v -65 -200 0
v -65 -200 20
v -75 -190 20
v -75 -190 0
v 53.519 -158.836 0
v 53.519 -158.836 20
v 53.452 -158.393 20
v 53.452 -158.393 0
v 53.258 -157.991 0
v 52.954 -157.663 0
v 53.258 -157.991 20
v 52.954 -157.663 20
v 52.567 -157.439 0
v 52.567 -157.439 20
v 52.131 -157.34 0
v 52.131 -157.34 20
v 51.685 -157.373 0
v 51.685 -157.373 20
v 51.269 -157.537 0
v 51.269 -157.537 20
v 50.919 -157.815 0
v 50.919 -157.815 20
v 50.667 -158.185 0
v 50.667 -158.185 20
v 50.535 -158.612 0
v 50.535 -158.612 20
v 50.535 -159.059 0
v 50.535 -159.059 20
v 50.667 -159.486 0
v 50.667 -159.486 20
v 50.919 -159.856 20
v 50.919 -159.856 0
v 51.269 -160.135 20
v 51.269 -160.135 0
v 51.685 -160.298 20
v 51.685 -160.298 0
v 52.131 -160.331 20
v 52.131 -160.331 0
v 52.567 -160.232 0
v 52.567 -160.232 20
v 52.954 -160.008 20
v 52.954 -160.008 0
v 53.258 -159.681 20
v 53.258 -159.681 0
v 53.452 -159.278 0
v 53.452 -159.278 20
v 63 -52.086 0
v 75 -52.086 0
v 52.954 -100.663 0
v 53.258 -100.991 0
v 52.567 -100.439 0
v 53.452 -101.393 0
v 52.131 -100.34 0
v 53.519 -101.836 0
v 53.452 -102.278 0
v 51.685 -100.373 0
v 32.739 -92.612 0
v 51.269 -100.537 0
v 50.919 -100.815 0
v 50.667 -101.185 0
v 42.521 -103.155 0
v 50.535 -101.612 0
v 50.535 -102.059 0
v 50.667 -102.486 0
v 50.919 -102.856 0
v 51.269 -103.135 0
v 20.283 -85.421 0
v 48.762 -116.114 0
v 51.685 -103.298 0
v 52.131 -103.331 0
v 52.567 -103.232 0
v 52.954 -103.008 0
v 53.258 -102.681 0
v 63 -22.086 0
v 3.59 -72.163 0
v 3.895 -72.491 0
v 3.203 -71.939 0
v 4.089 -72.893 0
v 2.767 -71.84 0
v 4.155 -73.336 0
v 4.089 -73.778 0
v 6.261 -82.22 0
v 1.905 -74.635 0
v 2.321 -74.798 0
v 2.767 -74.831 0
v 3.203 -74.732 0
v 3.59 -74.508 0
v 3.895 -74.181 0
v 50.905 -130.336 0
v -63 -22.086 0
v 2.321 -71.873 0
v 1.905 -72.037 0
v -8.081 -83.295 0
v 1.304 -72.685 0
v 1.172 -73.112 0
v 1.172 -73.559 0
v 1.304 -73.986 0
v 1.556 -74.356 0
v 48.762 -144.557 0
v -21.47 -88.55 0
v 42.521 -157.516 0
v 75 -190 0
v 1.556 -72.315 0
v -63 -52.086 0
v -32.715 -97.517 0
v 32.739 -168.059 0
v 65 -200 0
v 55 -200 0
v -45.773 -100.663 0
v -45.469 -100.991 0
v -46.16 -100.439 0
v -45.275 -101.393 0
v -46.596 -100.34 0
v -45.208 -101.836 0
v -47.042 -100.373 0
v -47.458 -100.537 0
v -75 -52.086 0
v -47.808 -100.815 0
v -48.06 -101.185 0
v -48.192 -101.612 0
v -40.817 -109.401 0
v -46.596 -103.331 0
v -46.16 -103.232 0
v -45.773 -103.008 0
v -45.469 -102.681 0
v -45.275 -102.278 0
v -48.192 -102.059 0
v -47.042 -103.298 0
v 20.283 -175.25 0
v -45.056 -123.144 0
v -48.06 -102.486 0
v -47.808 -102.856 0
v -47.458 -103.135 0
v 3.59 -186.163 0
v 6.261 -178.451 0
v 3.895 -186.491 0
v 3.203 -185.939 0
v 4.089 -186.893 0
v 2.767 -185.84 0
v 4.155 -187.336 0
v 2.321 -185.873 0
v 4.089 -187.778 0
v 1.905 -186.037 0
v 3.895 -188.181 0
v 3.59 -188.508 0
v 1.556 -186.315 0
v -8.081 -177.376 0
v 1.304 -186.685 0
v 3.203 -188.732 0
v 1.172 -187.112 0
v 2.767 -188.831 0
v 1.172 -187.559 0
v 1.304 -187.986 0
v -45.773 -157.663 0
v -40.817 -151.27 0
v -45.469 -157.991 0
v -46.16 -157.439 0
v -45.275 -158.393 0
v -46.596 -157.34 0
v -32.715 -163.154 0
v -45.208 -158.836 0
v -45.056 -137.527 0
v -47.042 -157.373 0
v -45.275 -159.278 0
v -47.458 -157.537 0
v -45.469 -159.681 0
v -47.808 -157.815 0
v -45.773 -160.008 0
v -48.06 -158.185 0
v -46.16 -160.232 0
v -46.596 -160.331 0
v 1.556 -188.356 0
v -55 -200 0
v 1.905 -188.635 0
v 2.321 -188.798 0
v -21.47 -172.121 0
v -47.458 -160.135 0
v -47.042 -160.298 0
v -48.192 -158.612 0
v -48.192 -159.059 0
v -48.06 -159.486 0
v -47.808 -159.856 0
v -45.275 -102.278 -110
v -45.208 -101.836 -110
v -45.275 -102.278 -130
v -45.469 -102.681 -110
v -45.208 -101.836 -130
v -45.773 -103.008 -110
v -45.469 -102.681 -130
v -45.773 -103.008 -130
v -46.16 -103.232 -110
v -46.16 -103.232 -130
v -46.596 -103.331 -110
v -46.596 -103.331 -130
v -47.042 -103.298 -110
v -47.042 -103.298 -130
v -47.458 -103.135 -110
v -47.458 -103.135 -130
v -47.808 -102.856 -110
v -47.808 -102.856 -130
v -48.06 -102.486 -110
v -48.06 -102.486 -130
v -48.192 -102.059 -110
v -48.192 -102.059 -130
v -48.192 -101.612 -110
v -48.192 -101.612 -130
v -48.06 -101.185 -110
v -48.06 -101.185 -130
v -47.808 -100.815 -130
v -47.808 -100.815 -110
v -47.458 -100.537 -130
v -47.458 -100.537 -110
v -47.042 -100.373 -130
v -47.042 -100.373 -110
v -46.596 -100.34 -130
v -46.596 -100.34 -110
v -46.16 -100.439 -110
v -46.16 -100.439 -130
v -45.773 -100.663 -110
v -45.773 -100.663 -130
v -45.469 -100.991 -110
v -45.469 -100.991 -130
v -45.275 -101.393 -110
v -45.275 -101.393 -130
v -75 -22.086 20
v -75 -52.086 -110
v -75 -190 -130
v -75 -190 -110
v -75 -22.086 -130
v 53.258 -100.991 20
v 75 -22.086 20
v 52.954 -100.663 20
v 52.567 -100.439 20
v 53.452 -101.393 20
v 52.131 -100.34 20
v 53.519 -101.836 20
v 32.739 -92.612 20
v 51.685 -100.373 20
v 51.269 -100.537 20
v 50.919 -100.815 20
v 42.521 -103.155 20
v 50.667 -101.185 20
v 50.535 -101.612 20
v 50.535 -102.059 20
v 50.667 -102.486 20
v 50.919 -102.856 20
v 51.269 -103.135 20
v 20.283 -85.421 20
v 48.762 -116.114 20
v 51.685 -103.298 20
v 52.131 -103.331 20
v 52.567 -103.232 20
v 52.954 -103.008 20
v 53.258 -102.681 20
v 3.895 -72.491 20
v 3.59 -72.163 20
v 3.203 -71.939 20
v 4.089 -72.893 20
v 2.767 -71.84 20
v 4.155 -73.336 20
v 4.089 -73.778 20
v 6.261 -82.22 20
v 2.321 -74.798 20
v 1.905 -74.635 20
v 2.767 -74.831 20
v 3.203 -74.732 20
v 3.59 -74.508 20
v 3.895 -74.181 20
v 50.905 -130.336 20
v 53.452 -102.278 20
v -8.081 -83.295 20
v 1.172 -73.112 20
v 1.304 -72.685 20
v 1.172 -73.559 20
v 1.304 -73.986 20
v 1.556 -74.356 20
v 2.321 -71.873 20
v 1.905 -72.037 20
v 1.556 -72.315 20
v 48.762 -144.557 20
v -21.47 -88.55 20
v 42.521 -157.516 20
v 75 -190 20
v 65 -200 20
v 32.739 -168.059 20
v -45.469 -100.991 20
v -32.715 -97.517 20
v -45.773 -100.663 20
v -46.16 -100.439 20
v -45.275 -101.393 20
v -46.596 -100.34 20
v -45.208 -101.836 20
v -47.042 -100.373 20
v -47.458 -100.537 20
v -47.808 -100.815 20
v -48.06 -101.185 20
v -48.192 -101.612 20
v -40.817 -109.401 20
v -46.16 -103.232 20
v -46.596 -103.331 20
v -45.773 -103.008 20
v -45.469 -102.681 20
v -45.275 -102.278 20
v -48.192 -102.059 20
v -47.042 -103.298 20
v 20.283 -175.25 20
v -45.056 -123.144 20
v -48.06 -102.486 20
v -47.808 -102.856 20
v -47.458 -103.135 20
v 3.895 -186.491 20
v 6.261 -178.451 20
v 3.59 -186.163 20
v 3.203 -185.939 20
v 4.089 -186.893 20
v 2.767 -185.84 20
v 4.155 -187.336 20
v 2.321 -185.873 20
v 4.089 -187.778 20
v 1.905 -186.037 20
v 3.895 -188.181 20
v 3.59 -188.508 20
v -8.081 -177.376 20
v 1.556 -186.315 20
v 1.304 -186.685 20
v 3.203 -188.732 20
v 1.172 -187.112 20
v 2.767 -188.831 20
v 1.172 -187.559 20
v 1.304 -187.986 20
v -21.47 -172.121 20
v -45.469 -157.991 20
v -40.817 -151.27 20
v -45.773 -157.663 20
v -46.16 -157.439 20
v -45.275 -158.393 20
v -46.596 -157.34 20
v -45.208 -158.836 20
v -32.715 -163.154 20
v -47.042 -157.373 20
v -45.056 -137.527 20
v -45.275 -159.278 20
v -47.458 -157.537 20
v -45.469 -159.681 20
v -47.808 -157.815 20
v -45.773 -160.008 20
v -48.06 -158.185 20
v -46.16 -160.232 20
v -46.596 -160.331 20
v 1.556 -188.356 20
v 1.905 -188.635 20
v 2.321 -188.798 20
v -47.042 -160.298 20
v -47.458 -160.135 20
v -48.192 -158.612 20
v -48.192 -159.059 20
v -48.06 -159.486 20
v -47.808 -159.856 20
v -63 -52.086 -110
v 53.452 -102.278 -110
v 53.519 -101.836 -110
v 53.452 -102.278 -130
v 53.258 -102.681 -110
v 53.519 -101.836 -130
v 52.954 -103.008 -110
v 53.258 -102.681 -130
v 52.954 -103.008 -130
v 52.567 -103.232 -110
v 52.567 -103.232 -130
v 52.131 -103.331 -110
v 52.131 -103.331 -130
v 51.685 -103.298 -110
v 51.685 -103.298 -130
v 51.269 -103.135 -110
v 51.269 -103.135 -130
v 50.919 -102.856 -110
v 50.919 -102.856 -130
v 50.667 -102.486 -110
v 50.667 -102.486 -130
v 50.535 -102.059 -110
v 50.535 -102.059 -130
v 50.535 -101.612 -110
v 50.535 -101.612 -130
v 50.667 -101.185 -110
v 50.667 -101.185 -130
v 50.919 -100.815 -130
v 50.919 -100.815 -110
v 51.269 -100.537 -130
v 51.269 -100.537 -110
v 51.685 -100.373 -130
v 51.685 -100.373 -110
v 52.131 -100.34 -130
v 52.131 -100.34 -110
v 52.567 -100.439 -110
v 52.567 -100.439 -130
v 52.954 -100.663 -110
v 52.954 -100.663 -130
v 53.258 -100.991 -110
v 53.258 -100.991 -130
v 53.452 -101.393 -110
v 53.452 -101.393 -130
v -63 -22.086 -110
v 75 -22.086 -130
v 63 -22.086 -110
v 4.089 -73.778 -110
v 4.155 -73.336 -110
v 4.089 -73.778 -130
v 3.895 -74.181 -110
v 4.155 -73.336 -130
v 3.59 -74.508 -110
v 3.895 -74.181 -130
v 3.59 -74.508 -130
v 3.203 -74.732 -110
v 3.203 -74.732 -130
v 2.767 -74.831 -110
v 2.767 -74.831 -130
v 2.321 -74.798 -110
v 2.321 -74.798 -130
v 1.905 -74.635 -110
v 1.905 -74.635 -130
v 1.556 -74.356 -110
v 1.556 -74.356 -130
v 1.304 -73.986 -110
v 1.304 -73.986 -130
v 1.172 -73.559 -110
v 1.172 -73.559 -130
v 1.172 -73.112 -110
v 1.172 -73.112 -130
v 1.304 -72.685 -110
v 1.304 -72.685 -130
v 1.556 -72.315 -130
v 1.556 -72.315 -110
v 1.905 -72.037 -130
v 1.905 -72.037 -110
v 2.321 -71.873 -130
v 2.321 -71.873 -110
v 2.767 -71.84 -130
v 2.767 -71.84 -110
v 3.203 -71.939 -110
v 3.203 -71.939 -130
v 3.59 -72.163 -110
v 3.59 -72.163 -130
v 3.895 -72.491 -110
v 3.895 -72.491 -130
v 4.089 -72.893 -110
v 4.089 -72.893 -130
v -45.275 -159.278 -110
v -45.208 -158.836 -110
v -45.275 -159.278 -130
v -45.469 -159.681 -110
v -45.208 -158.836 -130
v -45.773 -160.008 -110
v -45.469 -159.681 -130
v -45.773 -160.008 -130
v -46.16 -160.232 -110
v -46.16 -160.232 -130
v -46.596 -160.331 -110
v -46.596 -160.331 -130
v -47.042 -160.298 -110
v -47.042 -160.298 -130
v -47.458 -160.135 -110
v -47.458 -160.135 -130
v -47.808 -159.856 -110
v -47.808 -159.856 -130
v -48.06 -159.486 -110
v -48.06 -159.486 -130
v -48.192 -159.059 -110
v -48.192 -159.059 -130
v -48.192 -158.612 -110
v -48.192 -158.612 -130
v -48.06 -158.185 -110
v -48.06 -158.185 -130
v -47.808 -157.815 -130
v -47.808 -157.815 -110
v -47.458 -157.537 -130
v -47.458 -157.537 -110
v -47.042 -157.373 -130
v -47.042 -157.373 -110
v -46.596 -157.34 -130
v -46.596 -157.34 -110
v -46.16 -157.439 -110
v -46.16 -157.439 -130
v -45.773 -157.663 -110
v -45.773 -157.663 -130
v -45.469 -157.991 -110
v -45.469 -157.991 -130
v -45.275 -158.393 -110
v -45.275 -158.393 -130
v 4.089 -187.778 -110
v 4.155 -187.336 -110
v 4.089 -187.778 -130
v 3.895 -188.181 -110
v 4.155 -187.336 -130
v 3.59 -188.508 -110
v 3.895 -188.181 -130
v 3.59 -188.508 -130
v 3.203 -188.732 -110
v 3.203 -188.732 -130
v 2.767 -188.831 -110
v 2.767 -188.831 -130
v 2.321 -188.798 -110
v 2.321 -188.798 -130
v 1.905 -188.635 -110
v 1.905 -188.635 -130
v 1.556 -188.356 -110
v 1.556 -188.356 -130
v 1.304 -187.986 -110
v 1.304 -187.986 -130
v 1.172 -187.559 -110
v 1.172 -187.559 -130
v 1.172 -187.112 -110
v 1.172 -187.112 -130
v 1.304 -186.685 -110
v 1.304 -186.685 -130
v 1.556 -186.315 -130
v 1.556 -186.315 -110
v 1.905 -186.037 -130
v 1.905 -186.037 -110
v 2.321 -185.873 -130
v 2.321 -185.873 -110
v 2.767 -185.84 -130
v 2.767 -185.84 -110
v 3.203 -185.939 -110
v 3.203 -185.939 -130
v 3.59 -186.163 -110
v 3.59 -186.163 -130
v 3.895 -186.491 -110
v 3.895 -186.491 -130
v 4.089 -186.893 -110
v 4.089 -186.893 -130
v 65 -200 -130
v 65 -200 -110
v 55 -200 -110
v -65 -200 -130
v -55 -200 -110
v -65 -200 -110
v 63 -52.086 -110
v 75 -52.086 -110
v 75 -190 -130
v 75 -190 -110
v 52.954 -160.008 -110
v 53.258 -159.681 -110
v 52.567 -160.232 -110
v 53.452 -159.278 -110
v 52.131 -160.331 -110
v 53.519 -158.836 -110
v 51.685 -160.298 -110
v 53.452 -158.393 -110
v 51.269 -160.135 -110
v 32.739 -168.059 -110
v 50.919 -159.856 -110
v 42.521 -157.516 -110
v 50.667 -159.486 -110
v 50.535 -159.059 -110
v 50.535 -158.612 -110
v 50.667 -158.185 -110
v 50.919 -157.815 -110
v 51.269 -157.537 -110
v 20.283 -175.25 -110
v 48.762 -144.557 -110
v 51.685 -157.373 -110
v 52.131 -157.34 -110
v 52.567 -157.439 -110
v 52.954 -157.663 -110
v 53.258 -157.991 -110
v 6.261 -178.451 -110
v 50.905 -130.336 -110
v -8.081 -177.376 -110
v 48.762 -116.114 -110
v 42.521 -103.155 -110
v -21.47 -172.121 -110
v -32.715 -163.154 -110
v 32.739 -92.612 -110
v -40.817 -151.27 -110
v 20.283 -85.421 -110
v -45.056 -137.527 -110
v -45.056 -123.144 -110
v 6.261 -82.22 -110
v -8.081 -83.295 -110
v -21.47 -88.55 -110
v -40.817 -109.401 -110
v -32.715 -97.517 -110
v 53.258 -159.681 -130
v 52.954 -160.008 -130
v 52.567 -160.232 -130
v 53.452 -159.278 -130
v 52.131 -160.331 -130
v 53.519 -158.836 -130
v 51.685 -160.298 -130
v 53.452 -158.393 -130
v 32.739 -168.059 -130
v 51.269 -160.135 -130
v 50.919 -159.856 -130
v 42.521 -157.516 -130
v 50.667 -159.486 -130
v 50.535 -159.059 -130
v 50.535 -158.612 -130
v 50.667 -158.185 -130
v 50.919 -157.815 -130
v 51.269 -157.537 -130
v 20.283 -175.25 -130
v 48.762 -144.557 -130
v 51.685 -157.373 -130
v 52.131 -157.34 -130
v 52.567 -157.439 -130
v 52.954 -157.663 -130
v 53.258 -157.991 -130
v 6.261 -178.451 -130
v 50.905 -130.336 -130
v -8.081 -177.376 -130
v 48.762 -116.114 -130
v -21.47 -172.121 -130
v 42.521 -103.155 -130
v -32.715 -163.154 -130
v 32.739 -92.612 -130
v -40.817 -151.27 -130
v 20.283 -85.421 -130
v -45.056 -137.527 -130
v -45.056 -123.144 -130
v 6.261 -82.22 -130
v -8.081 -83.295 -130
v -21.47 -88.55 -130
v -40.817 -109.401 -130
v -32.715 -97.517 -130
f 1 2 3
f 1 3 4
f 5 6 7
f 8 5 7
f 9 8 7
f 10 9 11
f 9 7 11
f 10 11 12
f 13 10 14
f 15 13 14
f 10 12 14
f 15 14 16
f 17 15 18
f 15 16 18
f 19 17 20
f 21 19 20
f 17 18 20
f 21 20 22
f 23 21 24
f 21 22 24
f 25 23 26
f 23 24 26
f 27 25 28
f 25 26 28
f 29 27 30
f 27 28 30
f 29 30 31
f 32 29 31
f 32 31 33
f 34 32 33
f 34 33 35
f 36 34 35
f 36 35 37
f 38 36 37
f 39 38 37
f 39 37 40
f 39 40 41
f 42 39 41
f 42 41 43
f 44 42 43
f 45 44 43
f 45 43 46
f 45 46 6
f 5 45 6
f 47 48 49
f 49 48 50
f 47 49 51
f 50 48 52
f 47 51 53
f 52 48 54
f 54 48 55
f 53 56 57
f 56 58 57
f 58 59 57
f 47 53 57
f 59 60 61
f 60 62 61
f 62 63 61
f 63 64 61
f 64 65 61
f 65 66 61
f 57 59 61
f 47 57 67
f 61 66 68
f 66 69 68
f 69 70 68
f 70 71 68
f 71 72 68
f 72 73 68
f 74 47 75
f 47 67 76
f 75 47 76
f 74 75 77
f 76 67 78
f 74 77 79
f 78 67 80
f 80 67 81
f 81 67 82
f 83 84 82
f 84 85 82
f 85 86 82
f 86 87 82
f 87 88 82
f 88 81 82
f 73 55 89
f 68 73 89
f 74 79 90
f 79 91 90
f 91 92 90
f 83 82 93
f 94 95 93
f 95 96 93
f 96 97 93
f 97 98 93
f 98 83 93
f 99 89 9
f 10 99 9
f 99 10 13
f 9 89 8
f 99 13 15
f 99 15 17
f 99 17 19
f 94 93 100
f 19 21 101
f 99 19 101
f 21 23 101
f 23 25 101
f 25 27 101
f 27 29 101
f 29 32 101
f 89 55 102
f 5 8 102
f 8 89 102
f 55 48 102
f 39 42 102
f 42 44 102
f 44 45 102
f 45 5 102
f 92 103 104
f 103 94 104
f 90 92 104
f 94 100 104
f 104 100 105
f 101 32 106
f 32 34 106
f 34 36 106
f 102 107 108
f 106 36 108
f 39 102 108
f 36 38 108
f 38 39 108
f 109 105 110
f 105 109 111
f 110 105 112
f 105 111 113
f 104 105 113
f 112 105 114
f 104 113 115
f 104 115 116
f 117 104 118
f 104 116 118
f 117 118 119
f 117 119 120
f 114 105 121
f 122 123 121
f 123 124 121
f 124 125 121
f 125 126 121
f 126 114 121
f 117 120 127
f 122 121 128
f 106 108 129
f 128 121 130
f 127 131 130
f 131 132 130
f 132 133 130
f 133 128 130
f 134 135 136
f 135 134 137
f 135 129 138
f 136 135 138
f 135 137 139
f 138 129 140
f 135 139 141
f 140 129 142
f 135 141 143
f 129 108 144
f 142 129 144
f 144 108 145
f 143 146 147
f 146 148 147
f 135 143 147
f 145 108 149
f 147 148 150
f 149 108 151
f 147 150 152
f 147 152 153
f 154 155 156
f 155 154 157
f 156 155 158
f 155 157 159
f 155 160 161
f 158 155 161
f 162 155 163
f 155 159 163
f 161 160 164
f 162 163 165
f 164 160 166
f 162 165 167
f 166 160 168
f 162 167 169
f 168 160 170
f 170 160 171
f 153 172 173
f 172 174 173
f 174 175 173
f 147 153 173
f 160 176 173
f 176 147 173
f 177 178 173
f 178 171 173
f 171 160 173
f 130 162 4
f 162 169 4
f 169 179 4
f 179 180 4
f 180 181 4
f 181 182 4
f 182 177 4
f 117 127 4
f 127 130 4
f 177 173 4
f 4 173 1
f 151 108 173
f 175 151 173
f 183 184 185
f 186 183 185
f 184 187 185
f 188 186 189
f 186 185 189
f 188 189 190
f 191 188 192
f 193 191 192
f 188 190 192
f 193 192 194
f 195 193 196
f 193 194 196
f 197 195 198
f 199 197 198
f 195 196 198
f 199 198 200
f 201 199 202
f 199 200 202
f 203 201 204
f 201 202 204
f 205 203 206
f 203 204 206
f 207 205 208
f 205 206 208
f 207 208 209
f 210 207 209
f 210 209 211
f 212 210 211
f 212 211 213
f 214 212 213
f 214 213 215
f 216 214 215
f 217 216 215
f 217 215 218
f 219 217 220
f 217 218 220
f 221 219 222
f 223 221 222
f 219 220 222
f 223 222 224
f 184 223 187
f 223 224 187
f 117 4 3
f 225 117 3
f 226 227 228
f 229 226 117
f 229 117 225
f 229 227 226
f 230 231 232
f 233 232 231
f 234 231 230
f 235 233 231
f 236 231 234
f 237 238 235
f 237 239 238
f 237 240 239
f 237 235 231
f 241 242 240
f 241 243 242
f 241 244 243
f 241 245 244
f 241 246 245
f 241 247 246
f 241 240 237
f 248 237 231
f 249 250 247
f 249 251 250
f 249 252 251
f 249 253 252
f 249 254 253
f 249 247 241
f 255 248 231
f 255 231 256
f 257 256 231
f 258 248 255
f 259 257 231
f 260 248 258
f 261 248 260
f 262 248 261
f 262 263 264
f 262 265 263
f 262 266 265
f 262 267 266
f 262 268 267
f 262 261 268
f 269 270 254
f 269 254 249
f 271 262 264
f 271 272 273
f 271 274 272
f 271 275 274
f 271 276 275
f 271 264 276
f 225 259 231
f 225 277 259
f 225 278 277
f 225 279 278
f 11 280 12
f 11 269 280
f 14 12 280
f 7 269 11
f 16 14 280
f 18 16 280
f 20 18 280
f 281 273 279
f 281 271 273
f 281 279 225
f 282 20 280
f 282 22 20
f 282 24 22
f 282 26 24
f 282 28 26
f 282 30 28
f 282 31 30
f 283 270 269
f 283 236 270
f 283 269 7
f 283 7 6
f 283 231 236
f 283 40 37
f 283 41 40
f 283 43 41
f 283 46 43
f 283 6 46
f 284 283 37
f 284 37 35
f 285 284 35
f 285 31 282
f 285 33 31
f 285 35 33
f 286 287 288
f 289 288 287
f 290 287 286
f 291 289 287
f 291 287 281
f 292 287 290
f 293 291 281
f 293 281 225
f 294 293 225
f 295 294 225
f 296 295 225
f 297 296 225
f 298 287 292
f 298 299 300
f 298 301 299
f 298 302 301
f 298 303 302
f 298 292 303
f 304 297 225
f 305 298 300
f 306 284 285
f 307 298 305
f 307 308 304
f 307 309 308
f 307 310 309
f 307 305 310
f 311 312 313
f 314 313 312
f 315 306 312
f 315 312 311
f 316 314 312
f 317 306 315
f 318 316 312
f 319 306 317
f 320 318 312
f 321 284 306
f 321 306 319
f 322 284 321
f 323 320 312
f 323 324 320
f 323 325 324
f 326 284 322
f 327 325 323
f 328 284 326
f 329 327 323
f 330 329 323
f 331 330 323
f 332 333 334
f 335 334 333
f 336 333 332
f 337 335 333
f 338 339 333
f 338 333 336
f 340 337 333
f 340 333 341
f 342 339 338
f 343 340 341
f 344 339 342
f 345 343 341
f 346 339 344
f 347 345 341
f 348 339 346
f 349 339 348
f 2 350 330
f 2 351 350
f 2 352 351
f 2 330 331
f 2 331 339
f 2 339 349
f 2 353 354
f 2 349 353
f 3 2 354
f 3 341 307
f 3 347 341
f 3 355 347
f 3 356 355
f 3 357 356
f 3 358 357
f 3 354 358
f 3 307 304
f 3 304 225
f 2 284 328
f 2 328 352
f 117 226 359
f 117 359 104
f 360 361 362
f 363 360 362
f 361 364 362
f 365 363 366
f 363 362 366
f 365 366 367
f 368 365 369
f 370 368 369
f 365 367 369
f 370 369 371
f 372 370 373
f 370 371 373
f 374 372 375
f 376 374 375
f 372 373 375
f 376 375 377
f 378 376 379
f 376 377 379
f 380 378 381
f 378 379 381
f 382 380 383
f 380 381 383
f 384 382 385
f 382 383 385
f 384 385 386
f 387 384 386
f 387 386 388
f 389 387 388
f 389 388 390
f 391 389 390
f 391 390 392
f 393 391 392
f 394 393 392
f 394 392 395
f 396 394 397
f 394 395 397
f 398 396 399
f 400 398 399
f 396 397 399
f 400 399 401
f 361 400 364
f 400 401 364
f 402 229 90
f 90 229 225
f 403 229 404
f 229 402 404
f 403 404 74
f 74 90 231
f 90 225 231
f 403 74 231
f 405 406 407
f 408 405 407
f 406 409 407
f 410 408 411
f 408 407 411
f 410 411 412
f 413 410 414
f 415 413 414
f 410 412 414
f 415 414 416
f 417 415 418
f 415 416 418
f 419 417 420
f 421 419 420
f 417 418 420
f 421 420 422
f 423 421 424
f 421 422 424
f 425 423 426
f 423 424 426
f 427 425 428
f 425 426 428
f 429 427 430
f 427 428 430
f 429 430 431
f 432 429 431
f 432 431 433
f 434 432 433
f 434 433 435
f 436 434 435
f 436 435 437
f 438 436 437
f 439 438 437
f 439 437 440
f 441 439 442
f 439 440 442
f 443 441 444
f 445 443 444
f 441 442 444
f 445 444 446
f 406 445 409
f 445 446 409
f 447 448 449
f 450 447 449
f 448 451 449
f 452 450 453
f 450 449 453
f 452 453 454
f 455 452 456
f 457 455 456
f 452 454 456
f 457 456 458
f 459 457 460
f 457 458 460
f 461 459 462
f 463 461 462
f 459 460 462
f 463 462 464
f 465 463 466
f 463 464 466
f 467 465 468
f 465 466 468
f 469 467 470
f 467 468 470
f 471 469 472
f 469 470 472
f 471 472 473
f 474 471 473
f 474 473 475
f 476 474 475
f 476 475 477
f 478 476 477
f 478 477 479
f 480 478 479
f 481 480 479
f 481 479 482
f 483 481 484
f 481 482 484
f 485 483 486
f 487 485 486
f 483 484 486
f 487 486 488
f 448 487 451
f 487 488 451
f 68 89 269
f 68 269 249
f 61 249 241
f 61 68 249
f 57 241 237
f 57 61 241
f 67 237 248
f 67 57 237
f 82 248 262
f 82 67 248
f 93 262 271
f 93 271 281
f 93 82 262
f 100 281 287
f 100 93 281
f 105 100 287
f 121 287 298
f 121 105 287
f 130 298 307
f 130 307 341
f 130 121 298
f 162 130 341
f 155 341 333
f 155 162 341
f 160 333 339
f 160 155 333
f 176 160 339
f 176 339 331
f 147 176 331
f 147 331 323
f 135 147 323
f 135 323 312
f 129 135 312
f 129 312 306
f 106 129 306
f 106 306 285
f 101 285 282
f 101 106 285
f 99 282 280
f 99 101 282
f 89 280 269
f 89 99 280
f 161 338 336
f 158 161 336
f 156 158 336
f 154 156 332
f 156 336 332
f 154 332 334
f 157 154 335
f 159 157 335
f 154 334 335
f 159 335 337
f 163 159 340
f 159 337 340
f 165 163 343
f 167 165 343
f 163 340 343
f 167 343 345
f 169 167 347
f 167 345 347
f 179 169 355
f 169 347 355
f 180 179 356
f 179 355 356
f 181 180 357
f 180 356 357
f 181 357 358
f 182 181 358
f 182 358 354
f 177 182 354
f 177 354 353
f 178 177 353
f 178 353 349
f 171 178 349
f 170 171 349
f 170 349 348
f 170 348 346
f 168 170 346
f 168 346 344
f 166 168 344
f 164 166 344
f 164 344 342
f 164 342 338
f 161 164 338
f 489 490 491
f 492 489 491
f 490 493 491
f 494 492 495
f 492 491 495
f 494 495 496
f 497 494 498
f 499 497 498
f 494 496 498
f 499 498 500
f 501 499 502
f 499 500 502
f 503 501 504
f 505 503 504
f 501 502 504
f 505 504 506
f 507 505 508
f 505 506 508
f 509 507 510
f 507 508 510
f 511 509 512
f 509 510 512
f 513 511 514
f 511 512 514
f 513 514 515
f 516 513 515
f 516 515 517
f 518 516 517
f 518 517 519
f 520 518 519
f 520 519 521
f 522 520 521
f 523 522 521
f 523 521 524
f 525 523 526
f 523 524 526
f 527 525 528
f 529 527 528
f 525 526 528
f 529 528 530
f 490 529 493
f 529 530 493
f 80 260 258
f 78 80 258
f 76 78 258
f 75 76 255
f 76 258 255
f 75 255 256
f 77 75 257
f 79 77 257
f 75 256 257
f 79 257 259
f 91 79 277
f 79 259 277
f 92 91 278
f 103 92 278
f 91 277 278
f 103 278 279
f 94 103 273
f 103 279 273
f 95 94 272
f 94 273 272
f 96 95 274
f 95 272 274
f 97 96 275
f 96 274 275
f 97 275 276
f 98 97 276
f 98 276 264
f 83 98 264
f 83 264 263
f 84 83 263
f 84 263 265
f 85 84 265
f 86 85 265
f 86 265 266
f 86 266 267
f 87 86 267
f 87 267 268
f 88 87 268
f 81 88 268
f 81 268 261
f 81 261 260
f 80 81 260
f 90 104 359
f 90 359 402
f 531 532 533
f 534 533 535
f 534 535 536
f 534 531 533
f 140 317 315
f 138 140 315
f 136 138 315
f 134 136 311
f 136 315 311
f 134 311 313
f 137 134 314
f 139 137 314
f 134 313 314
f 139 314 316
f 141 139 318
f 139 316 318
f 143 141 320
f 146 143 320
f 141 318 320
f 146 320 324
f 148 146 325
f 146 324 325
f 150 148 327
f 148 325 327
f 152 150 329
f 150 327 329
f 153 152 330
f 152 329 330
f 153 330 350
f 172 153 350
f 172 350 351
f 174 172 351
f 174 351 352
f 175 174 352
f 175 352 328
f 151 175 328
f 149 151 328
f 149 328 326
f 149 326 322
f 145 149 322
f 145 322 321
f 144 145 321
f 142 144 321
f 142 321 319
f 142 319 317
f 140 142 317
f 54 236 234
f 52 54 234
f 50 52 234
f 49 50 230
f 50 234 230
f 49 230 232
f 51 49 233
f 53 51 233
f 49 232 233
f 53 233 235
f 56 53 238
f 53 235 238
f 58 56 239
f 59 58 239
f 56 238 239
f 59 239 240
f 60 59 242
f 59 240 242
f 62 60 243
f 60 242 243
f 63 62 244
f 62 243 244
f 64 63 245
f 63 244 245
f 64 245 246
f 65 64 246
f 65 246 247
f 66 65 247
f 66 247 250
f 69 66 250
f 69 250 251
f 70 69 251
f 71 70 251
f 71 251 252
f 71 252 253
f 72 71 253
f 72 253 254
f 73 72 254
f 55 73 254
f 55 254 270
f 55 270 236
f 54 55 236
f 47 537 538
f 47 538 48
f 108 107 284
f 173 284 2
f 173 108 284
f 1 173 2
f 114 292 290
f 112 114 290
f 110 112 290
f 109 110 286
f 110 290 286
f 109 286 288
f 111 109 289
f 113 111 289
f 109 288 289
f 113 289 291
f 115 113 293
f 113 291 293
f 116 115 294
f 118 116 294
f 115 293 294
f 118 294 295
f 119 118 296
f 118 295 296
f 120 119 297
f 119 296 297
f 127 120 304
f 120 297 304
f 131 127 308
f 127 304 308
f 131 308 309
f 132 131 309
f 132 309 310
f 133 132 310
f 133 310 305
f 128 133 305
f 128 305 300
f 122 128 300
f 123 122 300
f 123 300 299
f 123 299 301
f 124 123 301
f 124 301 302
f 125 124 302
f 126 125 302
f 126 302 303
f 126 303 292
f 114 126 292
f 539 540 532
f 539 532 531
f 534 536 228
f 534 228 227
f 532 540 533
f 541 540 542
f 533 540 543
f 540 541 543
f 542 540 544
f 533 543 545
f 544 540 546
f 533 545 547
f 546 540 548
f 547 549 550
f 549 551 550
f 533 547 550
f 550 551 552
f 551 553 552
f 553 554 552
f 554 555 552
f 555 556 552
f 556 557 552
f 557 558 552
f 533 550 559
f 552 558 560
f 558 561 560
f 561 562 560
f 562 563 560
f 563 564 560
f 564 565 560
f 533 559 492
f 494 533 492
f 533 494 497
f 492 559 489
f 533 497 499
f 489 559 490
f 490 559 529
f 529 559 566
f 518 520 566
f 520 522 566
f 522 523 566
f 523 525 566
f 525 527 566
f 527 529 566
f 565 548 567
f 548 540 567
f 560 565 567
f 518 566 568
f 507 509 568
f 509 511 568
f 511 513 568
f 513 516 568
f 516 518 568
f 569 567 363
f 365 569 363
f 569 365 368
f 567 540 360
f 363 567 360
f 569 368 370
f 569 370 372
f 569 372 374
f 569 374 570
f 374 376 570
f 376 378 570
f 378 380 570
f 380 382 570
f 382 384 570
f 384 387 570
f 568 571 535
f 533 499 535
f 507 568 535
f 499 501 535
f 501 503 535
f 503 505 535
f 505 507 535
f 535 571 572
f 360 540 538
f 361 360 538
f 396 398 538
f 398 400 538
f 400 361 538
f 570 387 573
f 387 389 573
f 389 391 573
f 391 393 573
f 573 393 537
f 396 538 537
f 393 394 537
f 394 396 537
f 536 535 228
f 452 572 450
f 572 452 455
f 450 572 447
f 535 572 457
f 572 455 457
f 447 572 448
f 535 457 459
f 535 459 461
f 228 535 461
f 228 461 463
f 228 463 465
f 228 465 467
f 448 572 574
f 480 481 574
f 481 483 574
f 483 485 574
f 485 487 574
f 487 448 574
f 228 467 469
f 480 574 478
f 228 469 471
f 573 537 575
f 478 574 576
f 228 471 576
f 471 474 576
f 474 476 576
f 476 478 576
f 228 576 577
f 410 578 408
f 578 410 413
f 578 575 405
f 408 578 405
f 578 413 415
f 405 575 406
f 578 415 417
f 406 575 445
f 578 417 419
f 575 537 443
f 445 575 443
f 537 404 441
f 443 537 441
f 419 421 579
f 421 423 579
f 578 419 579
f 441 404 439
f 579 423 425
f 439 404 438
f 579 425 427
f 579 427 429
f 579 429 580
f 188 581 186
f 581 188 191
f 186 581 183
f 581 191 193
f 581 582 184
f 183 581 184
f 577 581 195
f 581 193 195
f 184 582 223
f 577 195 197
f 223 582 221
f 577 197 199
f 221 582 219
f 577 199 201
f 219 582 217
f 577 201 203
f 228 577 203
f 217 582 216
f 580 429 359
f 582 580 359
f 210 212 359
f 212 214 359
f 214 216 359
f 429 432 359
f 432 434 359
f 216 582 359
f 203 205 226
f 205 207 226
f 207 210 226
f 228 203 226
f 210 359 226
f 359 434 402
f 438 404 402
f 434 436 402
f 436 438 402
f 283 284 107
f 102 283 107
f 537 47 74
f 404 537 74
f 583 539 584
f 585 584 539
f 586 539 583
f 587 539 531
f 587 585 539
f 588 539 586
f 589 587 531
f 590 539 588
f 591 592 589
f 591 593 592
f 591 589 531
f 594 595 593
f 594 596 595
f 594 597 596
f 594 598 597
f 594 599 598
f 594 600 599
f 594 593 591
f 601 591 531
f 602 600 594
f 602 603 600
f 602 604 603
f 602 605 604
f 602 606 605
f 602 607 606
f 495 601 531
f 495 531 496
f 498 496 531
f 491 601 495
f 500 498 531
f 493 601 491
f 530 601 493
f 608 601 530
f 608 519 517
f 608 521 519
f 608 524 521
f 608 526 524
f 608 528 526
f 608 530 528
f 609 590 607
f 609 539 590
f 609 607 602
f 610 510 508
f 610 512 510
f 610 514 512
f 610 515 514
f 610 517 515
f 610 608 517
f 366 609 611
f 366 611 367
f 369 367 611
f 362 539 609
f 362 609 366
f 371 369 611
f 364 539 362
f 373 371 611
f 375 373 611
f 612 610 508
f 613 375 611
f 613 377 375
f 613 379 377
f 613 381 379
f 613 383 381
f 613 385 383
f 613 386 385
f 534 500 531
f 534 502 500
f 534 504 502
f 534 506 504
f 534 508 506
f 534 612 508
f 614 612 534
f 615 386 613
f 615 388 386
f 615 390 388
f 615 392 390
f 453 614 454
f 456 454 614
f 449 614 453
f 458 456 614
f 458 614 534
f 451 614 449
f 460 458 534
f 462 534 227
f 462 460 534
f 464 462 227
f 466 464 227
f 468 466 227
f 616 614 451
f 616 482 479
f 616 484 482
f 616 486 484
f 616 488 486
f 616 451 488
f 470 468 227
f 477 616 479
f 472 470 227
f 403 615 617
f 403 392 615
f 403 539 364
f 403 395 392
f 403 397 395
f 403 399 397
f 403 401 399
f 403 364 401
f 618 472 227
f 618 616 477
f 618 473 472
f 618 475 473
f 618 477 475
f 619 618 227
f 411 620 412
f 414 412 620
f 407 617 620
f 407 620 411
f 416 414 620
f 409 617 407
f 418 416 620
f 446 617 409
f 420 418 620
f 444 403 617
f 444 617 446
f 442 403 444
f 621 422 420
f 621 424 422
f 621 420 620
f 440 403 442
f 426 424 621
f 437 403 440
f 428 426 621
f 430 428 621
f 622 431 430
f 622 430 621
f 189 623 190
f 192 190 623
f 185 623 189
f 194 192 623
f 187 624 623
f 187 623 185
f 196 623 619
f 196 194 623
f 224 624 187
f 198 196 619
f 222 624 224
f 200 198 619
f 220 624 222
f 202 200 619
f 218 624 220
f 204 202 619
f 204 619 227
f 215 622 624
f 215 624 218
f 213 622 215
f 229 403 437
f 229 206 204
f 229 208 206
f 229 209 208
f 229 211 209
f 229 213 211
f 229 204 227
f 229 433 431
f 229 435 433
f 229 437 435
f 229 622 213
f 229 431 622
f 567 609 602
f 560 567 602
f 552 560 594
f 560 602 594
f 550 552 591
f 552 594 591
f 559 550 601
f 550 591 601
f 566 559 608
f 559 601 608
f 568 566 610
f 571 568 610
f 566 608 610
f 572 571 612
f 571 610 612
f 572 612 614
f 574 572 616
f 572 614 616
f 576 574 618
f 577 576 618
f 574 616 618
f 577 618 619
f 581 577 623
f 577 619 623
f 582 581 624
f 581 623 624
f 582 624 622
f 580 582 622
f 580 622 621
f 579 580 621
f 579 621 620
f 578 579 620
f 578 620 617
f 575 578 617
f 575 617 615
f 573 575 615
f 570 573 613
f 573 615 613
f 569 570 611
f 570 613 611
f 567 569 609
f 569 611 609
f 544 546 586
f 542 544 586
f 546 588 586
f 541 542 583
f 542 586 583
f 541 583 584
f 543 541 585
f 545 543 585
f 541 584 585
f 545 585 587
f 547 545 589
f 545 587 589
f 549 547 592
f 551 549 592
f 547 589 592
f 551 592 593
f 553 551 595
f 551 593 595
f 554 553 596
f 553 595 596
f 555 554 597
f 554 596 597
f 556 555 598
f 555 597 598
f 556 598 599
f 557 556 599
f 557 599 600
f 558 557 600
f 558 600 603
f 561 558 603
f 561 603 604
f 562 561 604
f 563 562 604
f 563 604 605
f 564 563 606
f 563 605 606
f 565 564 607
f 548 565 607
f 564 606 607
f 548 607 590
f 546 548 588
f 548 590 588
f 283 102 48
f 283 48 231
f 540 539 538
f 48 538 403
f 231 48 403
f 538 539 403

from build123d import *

# Parameters (mm, degrees)
EXTRUDE_1_OUTLINE_W     = 150
EXTRUDE_1_OUTLINE_H     = 400
EXTRUDE_1_OUTLINE_R     = 48.25
EXTRUDE_1_DEPTH         = 20
SKETCH_2_W              = 150
SKETCH_2_H              = 400
SKETCH_2_W_2            = 126
SKETCH_2_H_2            = 376
EXTRUDE_1_2_DEPTH       = 110
EXTRUDE_START           = 20
SKETCH_3_W              = 150
SKETCH_3_H              = 400
SKETCH_3_R              = 48.25
EXTRUDE_3_DEPTH         = 20
SKETCH_4_W              = 110
SKETCH_4_H              = 55
CUT_EXTRUDE_1_DEPTH     = 428.229446551
CHAMFER_2_SIZE          = 20
CHAMFER_3_SIZE          = 20
CUT_EXTRUDE_START       = 190
CUT_EXTRUDE_2_OUTLINE_W = 132
CUT_EXTRUDE_2_OUTLINE_H = 152
CUT_EXTRUDE_2_DEPTH     = 10
FILLET_1_R              = 20
FILLET_2_R              = 20
FILLET_3_R              = 20
FILLET_4_R              = 20
EXTRUDE_START_2         = -20
SKETCH_6_R              = 48.25
SKETCH_6_R_2            = 29.5
EXTRUDE_4_DEPTH         = 20
SKETCH_7_R              = 48.25
SKETCH_7_R_2            = 29.5
EXTRUDE_5_DEPTH         = 20
SKETCH_8_R              = 29.5
EXTRUDE_7_DEPTH         = 20
SKETCH_9_R              = 29.5
EXTRUDE_8_DEPTH         = 20
SKETCH_10_R             = 1.65
EXTRUDE_9_DEPTH         = 10
EXTRUDE_START_3         = 10
SKETCH_11_R             = 1.65
EXTRUDE_10_DEPTH        = 10
SKETCH_12_W             = 110
SKETCH_12_H             = 147.914448675
CUT_EXTRUDE_3_DEPTH     = 287.530975638
CHAMFER_4_SIZE          = 10
CHAMFER_5_SIZE          = 10
SKETCH_13_W             = 150
SKETCH_13_H             = 80
CUT_EXTRUDE_5_DEPTH     = 267.880122902
CUT_EXTRUDE_6_REACH     = 263.008
SKETCH_15_R             = 1.5
SKETCH_16_R             = 1.5
CUT_EXTRUDE_7_DEPTH     = 262.007662723


with BuildPart() as part:
    # Extrude 1: read off the stored shape, not the designer's step
    # Extrude 1 outline → Extrude 1 (new body)
    with BuildSketch(Plane.XY):
        Rectangle(EXTRUDE_1_OUTLINE_W, EXTRUDE_1_OUTLINE_H)
        with Locations((2.655190842, -130.335551325)):
            Circle(EXTRUDE_1_OUTLINE_R, mode=Mode.SUBTRACT)
        with Locations((0, 129.13990983)):
            Circle(EXTRUDE_1_OUTLINE_R, mode=Mode.SUBTRACT)
    extrude(amount=EXTRUDE_1_DEPTH)

    # 草图2 → Extrude 1 2 (add)
    with BuildSketch(Plane(origin=(0, 0, 0), x_dir=(-1, 0, 0), z_dir=(0, 0, -1))):
        Rectangle(SKETCH_2_W, SKETCH_2_H)
        Rectangle(SKETCH_2_W_2, SKETCH_2_H_2, mode=Mode.SUBTRACT)
    extrude(amount=EXTRUDE_1_2_DEPTH)

    # 草图3 → 凸台-拉伸3 (add)
    with BuildSketch(Plane(origin=(0, 0, -110), x_dir=(-1, 0, 0), z_dir=(0, 0, -1)).offset(EXTRUDE_START)):
        Rectangle(SKETCH_3_W, SKETCH_3_H)
        with Locations(Location((-2.655190842, -130.335551325, 0), (0, 0, 180))):
            Circle(SKETCH_3_R, mode=Mode.SUBTRACT)
        with Locations(Location((0, 129.13990983, 0), (0, 0, 180))):
            Circle(SKETCH_3_R, mode=Mode.SUBTRACT)
    extrude(amount=-EXTRUDE_3_DEPTH)

    # 草图4 → 切除-拉伸1 (cut, through all)
    with BuildSketch(Plane.XZ.offset(200)):
        with Locations((0, -27.5)):
            Rectangle(SKETCH_4_W, SKETCH_4_H)
        with Locations((0, -82.5)):
            Rectangle(SKETCH_4_W, SKETCH_4_H)
    extrude(amount=-CUT_EXTRUDE_1_DEPTH, mode=Mode.SUBTRACT)

    # 倒角2
    chamfer_2_edges = [part.edges().sort_by_distance(p)[0] for p in [
        (-75, 200, -55),
    ]]
    chamfer(chamfer_2_edges, length=CHAMFER_2_SIZE - 0.0001)  # a hair under: the kernel refuses the full size

    # 倒角3
    chamfer_3_edges = [part.edges().sort_by_distance(p)[0] for p in [
        (75, 200, -55),
    ]]
    chamfer(chamfer_3_edges, length=CHAMFER_3_SIZE - 0.0001)  # a hair under: the kernel refuses the full size

    # 切除-拉伸2: read off the stored shape, not the designer's step
    # 切除-拉伸2 outline → 切除-拉伸2 (cut)
    with BuildSketch(Plane(origin=(0, 0, 0), x_dir=(1, 0, 0), z_dir=(0, 1, 0)).offset(CUT_EXTRUDE_START)):
        with Locations((0, 55)):
            Rectangle(CUT_EXTRUDE_2_OUTLINE_W, CUT_EXTRUDE_2_OUTLINE_H)
    extrude(amount=CUT_EXTRUDE_2_DEPTH, mode=Mode.SUBTRACT)

    # 圆角1
    fillet_1_edges = [part.edges().sort_by_distance(p)[0] for p in [
        (-65.0001, 190, -55),
    ]]
    fillet(fillet_1_edges, radius=FILLET_1_R)

    # 圆角2
    fillet_2_edges = [part.edges().sort_by_distance(p)[0] for p in [
        (65.0001, 190, -55),
    ]]
    fillet(fillet_2_edges, radius=FILLET_2_R)

    # 圆角3
    # the kernel refuses this fillet: 20 mm, written as the material it takes off along each edge
    with BuildSketch(Plane(origin=(-75, 180.0001, 40.112615753), x_dir=(0.7071067811865488, 0.7071067811865464, 0), z_dir=(0, 0, -1))) as fillet_3_piece_1:
        with BuildLine():
            CenterArc((8.453428829, 19.830842418), FILLET_3_R, 225, 37.542814558)
            Line((-5.688706794, 5.688706794), (-5.971549507, 5.405864082))
            Line((-5.971549507, 5.405864082), (-0.282842712, -0.282842712))
            Line((-0.282842712, -0.282842712), (0, -0.4))
            ThreePointArc((0, -0.4), (2.928861477, -0.4), (5.805808837, -0.396616848))
            Line((5.805808837, -0.396616848), (5.857722955, 0))
        make_face()
    extrude(amount=190.225231505, mode=Mode.SUBTRACT)

    # 圆角4
    # the kernel refuses this fillet: 20 mm, written as the material it takes off along each edge
    with BuildSketch(Plane(origin=(75, 180.0001, -150.112615753), x_dir=(-0.7071067811865438, 0.7071067811865511, 0), z_dir=(0, 0, 1))) as fillet_4_piece_1:
        with BuildLine():
            CenterArc((8.453428829, 19.830842418), FILLET_4_R, 225, 37.542814558)
            Line((-5.688706794, 5.688706794), (-5.971549507, 5.405864082))
            Line((-5.971549507, 5.405864082), (-0.282842712, -0.282842712))
            Line((-0.282842712, -0.282842712), (0, -0.4))
            ThreePointArc((0, -0.4), (2.928861477, -0.4), (5.805808837, -0.396616848))
            Line((5.805808837, -0.396616848), (5.857722955, 0))
        make_face()
    extrude(amount=190.225231505, mode=Mode.SUBTRACT)

    # 草图6 → 凸台-拉伸4 (add)
    with BuildSketch(Plane.XY.offset(20).offset(EXTRUDE_START_2)):
        with Locations(Location((0, 129.13990983, 0), (0, 0, 180))):
            Circle(SKETCH_6_R)
        with Locations((0, 129.13990983)):
            Circle(SKETCH_6_R_2, mode=Mode.SUBTRACT)
    extrude(amount=EXTRUDE_4_DEPTH)

    # 草图7 → 凸台-拉伸5 (add)
    with BuildSketch(Plane(origin=(0, 0, -130), x_dir=(-1, 0, 0), z_dir=(0, 0, -1))):
        with Locations((0, 129.13990983)):
            Circle(SKETCH_7_R)
        with Locations(Location((0, 129.13990983, 0), (0, 0, 180))):
            Circle(SKETCH_7_R_2, mode=Mode.SUBTRACT)
    extrude(amount=-EXTRUDE_5_DEPTH)

    # 草图8 → 凸台-拉伸7 (add)
    with BuildSketch(Plane.XY.offset(20).offset(EXTRUDE_START_2)):
        with Locations(Location((0, 129.13990983, 0), (0, 0, 180))):
            Circle(SKETCH_8_R)
    extrude(amount=EXTRUDE_7_DEPTH)

    # 草图9 → 凸台-拉伸8 (add)
    with BuildSketch(Plane(origin=(0, 0, -130), x_dir=(-1, 0, 0), z_dir=(0, 0, -1))):
        with Locations((0, 129.13990983)):
            Circle(SKETCH_9_R)
    extrude(amount=-EXTRUDE_8_DEPTH)

    # 草图10 → 凸台-拉伸9 (add)
    with BuildSketch(Plane(origin=(0, 0, -130), x_dir=(-1, 0, 0), z_dir=(0, 0, -1))):
        with Locations((0, 146.38990983)):
            Circle(SKETCH_10_R)
        with Locations((14.938938215, 137.76490983)):
            Circle(SKETCH_10_R)
        with Locations((14.938938215, 120.51490983)):
            Circle(SKETCH_10_R)
        with Locations((0, 111.88990983)):
            Circle(SKETCH_10_R)
        with Locations((-14.938938215, 120.51490983)):
            Circle(SKETCH_10_R)
        with Locations((-14.938938215, 137.76490983)):
            Circle(SKETCH_10_R)
    extrude(amount=EXTRUDE_9_DEPTH)

    # 草图11 → 凸台-拉伸10 (add)
    with BuildSketch(Plane.XY.offset(20).offset(EXTRUDE_START_3)):
        with Locations(Location((-14.938938215, 137.76490983, 0), (0, 0, 180))):
            Circle(SKETCH_11_R)
        with Locations(Location((-14.938938215, 120.51490983, 0), (0, 0, 180))):
            Circle(SKETCH_11_R)
        with Locations(Location((0, 111.88990983, 0), (0, 0, 180))):
            Circle(SKETCH_11_R)
        with Locations(Location((14.938938215, 120.51490983, 0), (0, 0, 180))):
            Circle(SKETCH_11_R)
        with Locations(Location((0, 146.38990983, 0), (0, 0, 180))):
            Circle(SKETCH_11_R)
        with Locations(Location((14.938938215, 137.76490983, 0), (0, 0, 180))):
            Circle(SKETCH_11_R)
    extrude(amount=-EXTRUDE_10_DEPTH)

    # 草图12 → 切除-拉伸3 (cut, through all)
    with BuildSketch(Plane.ZY.offset(75)):
        with Locations((-55, -126.042775663)):
            Rectangle(SKETCH_12_W, SKETCH_12_H)
    extrude(amount=-CUT_EXTRUDE_3_DEPTH, mode=Mode.SUBTRACT)

    # 倒角4
    chamfer_4_edges = [part.edges().sort_by_distance(p)[0] for p in [
        (-75, -200, -120),
    ]]
    chamfer(chamfer_4_edges, length=CHAMFER_4_SIZE)

    # 倒角5
    chamfer_5_edges = [part.edges().sort_by_distance(p)[0] for p in [
        (75, -200, -120),
        (-75, -200, 10),
        (75, -200, 10),
    ]]
    chamfer(chamfer_5_edges, length=CHAMFER_5_SIZE)

    # 草图13 → 切除-拉伸5 (cut, through all)
    with BuildSketch(Plane.XY.offset(20)):
        with Locations((0, 17.914448675)):
            Rectangle(SKETCH_13_W, SKETCH_13_H)
    extrude(amount=-CUT_EXTRUDE_5_DEPTH, mode=Mode.SUBTRACT)


with BuildPart() as body_2:
    # of the pieces the cut leaves, the one that is kept (cut_extrude_5_keep)
    add(part.part.solids().sort_by_distance((65, -200, -110))[0])

    # 草图15 → 切除-拉伸6 (cut, up to next)
    with BuildSketch(Plane.XY.offset(20), mode=Mode.PRIVATE) as cut_extrude_6_sk1:
        with Locations((2.655190842, -73.335551325)):
            Circle(SKETCH_15_R)
    cut_extrude_6_tool1 = extrude(cut_extrude_6_sk1.sketch, amount=-CUT_EXTRUDE_6_REACH, mode=Mode.PRIVATE) & body_2.part
    # 草图15 → 切除-拉伸6 (cut, up to next)
    with BuildSketch(Plane.XY.offset(20), mode=Mode.PRIVATE) as cut_extrude_6_sk2:
        with Locations((52.018638858, -101.835551325)):
            Circle(SKETCH_15_R)
    cut_extrude_6_tool2 = extrude(cut_extrude_6_sk2.sketch, amount=-CUT_EXTRUDE_6_REACH, mode=Mode.PRIVATE) & body_2.part
    # 草图15 → 切除-拉伸6 (cut, up to next)
    with BuildSketch(Plane.XY.offset(20), mode=Mode.PRIVATE) as cut_extrude_6_sk3:
        with Locations((52.018638858, -158.835551325)):
            Circle(SKETCH_15_R)
    cut_extrude_6_tool3 = extrude(cut_extrude_6_sk3.sketch, amount=-CUT_EXTRUDE_6_REACH, mode=Mode.PRIVATE) & body_2.part
    # 草图15 → 切除-拉伸6 (cut, up to next)
    with BuildSketch(Plane.XY.offset(20), mode=Mode.PRIVATE) as cut_extrude_6_sk4:
        with Locations((2.655190842, -187.335551325)):
            Circle(SKETCH_15_R)
    cut_extrude_6_tool4 = extrude(cut_extrude_6_sk4.sketch, amount=-CUT_EXTRUDE_6_REACH, mode=Mode.PRIVATE) & body_2.part
    # 草图15 → 切除-拉伸6 (cut, up to next)
    with BuildSketch(Plane.XY.offset(20), mode=Mode.PRIVATE) as cut_extrude_6_sk5:
        with Locations((-46.708257174, -158.835551325)):
            Circle(SKETCH_15_R)
    cut_extrude_6_tool5 = extrude(cut_extrude_6_sk5.sketch, amount=-CUT_EXTRUDE_6_REACH, mode=Mode.PRIVATE) & body_2.part
    # 草图15 → 切除-拉伸6 (cut, up to next)
    with BuildSketch(Plane.XY.offset(20), mode=Mode.PRIVATE) as cut_extrude_6_sk6:
        with Locations((-46.708257174, -101.835551325)):
            Circle(SKETCH_15_R)
    cut_extrude_6_tool6 = extrude(cut_extrude_6_sk6.sketch, amount=-CUT_EXTRUDE_6_REACH, mode=Mode.PRIVATE) & body_2.part
    add(cut_extrude_6_tool1.solids().sort_by_distance((2.655191, -73.335551, 20))[0], mode=Mode.SUBTRACT)
    add(cut_extrude_6_tool2.solids().sort_by_distance((52.018639, -101.835551, 20))[0], mode=Mode.SUBTRACT)
    add(cut_extrude_6_tool3.solids().sort_by_distance((52.018639, -158.835551, 20))[0], mode=Mode.SUBTRACT)
    add(cut_extrude_6_tool4.solids().sort_by_distance((2.655191, -187.335551, 20))[0], mode=Mode.SUBTRACT)
    add(cut_extrude_6_tool5.solids().sort_by_distance((-46.708257, -158.835551, 20))[0], mode=Mode.SUBTRACT)
    add(cut_extrude_6_tool6.solids().sort_by_distance((-46.708257, -101.835551, 20))[0], mode=Mode.SUBTRACT)

    # 草图16 → 切除-拉伸7 (cut, through all)
    with BuildSketch(Plane(origin=(0, 0, -130), x_dir=(-1, 0, 0), z_dir=(0, 0, -1))):
        with Locations(Location((-52.018638858, -101.835551325, 0), (0, 0, 180))):
            Circle(SKETCH_16_R)
        with Locations(Location((-2.655190842, -73.335551325, 0), (0, 0, 180))):
            Circle(SKETCH_16_R)
        with Locations(Location((46.708257174, -158.835551325, 0), (0, 0, 180))):
            Circle(SKETCH_16_R)
        with Locations(Location((-52.018638858, -158.835551325, 0), (0, 0, 180))):
            Circle(SKETCH_16_R)
        with Locations(Location((-2.655190842, -187.335551325, 0), (0, 0, 180))):
            Circle(SKETCH_16_R)
        with Locations(Location((46.708257174, -101.835551325, 0), (0, 0, 180))):
            Circle(SKETCH_16_R)
    extrude(amount=-CUT_EXTRUDE_7_DEPTH, mode=Mode.SUBTRACT)


solid = body_2.part
